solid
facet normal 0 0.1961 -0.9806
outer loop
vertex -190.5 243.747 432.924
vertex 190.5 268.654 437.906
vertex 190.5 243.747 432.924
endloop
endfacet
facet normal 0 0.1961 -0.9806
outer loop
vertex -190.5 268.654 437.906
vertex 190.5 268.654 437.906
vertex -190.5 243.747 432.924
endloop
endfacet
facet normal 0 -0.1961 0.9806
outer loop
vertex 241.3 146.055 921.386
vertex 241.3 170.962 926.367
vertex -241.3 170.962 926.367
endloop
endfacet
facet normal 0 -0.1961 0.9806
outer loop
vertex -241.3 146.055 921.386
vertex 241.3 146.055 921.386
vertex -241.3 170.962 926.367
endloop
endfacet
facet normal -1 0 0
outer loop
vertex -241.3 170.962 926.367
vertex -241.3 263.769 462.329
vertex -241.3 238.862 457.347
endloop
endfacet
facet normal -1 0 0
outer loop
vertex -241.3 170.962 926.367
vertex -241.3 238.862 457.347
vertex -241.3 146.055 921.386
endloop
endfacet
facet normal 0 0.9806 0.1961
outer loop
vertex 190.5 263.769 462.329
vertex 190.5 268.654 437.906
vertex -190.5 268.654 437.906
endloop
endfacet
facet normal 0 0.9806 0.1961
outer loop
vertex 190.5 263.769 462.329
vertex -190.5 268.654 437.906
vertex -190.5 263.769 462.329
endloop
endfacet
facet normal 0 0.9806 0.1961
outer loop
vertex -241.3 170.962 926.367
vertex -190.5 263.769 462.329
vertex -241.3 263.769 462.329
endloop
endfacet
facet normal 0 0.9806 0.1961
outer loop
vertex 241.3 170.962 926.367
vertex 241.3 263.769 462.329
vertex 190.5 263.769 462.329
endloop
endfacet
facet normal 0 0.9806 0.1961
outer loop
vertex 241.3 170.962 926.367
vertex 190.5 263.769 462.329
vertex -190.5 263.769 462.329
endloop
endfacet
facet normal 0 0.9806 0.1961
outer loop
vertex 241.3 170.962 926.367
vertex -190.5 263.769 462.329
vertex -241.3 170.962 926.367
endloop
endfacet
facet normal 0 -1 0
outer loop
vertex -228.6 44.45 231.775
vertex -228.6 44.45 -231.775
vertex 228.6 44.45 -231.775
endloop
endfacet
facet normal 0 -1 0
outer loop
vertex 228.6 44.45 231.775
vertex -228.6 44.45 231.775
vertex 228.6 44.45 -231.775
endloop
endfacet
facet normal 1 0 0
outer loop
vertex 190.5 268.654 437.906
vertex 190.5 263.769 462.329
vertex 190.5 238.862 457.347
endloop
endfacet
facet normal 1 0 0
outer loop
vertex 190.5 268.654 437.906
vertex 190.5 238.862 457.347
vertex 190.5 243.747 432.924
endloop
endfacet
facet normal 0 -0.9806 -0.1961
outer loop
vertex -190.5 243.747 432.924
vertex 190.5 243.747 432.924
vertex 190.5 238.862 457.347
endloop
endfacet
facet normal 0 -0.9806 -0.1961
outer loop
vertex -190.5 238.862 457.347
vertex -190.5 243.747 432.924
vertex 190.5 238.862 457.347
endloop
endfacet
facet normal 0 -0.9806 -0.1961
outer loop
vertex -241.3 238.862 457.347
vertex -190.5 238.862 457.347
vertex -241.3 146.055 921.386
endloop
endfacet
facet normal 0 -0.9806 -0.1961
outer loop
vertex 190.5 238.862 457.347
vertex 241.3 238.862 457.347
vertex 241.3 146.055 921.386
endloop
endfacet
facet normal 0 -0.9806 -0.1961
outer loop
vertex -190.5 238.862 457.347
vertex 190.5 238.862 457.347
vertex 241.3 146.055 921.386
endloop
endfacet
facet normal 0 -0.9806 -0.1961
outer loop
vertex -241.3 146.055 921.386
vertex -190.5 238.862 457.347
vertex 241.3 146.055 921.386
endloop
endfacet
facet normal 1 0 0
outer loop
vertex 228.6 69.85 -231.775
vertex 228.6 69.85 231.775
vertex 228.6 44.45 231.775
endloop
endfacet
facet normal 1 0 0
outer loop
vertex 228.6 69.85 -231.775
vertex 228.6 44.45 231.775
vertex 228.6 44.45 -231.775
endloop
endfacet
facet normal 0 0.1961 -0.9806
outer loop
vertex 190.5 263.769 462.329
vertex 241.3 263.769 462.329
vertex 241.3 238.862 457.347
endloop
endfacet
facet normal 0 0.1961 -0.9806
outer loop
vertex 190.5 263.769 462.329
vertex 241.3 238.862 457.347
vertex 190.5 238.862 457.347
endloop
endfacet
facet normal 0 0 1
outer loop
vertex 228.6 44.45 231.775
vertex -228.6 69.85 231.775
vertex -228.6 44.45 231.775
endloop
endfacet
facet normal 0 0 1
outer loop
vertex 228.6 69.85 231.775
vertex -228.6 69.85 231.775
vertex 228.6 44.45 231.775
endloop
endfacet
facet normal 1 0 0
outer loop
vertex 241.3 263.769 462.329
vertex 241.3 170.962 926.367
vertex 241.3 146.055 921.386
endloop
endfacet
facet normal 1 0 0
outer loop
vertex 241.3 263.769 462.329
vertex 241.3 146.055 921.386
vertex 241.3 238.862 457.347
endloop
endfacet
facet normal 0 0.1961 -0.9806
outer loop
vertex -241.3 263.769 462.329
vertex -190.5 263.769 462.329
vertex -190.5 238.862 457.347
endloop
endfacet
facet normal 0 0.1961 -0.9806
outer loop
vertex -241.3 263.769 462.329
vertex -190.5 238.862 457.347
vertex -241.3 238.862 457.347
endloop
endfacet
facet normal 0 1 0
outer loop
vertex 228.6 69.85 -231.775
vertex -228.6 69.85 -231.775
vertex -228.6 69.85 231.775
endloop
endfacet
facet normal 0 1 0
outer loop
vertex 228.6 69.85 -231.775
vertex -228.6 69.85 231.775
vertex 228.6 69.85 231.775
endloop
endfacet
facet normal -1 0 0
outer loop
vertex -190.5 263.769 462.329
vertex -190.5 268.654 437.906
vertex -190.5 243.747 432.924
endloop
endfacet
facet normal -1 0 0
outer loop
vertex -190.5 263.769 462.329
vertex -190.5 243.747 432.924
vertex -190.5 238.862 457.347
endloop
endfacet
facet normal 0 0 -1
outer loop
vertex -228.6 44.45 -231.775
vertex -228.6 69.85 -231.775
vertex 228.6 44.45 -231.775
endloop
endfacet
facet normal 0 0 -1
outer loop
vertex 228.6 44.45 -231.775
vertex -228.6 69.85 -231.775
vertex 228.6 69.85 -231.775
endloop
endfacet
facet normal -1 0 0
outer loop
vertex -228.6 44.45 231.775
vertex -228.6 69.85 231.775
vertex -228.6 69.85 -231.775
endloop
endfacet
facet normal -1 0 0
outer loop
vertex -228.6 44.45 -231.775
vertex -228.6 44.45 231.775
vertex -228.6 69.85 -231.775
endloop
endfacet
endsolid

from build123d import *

# Parameters (mm, degrees)
SKETCH3_W           = 457.2
SKETCH3_H           = 463.55
BOSS_EXTRUDE1_DEPTH = 25.4
BOSS_EXTRUDE2_DEPTH = 25.4


with BuildPart() as part:
    # Sketch3 → Boss-Extrude1 (new body)
    with BuildSketch(Plane(origin=(0, 69.85, 0), x_dir=(1, 0, 0), z_dir=(0, 1, 0))):
        Rectangle(SKETCH3_W, SKETCH3_H)
    extrude(amount=-BOSS_EXTRUDE1_DEPTH)


with BuildPart() as body_2:
    # Sketch4 → Boss-Extrude2 (new body)
    with BuildSketch(Plane(origin=(0, 342.533653846, 68.506730769), x_dir=(0, 0.196116135, -0.980580676), z_dir=(0, -0.980580676, -0.196116135))):
        Polygon((-874.849564335, 190.5), (-874.849564335, 241.3), (-401.621330246, 241.3), (-401.621330246, 190.5), (-376.714581084, 190.5), (-376.714581084, -190.5), (-401.621330246, -190.5), (-401.621330246, -241.3), (-874.849564335, -241.3), (-874.849564335, -190.5), align=None)
    extrude(amount=BOSS_EXTRUDE2_DEPTH)


solid = Compound([part.part, body_2.part])
